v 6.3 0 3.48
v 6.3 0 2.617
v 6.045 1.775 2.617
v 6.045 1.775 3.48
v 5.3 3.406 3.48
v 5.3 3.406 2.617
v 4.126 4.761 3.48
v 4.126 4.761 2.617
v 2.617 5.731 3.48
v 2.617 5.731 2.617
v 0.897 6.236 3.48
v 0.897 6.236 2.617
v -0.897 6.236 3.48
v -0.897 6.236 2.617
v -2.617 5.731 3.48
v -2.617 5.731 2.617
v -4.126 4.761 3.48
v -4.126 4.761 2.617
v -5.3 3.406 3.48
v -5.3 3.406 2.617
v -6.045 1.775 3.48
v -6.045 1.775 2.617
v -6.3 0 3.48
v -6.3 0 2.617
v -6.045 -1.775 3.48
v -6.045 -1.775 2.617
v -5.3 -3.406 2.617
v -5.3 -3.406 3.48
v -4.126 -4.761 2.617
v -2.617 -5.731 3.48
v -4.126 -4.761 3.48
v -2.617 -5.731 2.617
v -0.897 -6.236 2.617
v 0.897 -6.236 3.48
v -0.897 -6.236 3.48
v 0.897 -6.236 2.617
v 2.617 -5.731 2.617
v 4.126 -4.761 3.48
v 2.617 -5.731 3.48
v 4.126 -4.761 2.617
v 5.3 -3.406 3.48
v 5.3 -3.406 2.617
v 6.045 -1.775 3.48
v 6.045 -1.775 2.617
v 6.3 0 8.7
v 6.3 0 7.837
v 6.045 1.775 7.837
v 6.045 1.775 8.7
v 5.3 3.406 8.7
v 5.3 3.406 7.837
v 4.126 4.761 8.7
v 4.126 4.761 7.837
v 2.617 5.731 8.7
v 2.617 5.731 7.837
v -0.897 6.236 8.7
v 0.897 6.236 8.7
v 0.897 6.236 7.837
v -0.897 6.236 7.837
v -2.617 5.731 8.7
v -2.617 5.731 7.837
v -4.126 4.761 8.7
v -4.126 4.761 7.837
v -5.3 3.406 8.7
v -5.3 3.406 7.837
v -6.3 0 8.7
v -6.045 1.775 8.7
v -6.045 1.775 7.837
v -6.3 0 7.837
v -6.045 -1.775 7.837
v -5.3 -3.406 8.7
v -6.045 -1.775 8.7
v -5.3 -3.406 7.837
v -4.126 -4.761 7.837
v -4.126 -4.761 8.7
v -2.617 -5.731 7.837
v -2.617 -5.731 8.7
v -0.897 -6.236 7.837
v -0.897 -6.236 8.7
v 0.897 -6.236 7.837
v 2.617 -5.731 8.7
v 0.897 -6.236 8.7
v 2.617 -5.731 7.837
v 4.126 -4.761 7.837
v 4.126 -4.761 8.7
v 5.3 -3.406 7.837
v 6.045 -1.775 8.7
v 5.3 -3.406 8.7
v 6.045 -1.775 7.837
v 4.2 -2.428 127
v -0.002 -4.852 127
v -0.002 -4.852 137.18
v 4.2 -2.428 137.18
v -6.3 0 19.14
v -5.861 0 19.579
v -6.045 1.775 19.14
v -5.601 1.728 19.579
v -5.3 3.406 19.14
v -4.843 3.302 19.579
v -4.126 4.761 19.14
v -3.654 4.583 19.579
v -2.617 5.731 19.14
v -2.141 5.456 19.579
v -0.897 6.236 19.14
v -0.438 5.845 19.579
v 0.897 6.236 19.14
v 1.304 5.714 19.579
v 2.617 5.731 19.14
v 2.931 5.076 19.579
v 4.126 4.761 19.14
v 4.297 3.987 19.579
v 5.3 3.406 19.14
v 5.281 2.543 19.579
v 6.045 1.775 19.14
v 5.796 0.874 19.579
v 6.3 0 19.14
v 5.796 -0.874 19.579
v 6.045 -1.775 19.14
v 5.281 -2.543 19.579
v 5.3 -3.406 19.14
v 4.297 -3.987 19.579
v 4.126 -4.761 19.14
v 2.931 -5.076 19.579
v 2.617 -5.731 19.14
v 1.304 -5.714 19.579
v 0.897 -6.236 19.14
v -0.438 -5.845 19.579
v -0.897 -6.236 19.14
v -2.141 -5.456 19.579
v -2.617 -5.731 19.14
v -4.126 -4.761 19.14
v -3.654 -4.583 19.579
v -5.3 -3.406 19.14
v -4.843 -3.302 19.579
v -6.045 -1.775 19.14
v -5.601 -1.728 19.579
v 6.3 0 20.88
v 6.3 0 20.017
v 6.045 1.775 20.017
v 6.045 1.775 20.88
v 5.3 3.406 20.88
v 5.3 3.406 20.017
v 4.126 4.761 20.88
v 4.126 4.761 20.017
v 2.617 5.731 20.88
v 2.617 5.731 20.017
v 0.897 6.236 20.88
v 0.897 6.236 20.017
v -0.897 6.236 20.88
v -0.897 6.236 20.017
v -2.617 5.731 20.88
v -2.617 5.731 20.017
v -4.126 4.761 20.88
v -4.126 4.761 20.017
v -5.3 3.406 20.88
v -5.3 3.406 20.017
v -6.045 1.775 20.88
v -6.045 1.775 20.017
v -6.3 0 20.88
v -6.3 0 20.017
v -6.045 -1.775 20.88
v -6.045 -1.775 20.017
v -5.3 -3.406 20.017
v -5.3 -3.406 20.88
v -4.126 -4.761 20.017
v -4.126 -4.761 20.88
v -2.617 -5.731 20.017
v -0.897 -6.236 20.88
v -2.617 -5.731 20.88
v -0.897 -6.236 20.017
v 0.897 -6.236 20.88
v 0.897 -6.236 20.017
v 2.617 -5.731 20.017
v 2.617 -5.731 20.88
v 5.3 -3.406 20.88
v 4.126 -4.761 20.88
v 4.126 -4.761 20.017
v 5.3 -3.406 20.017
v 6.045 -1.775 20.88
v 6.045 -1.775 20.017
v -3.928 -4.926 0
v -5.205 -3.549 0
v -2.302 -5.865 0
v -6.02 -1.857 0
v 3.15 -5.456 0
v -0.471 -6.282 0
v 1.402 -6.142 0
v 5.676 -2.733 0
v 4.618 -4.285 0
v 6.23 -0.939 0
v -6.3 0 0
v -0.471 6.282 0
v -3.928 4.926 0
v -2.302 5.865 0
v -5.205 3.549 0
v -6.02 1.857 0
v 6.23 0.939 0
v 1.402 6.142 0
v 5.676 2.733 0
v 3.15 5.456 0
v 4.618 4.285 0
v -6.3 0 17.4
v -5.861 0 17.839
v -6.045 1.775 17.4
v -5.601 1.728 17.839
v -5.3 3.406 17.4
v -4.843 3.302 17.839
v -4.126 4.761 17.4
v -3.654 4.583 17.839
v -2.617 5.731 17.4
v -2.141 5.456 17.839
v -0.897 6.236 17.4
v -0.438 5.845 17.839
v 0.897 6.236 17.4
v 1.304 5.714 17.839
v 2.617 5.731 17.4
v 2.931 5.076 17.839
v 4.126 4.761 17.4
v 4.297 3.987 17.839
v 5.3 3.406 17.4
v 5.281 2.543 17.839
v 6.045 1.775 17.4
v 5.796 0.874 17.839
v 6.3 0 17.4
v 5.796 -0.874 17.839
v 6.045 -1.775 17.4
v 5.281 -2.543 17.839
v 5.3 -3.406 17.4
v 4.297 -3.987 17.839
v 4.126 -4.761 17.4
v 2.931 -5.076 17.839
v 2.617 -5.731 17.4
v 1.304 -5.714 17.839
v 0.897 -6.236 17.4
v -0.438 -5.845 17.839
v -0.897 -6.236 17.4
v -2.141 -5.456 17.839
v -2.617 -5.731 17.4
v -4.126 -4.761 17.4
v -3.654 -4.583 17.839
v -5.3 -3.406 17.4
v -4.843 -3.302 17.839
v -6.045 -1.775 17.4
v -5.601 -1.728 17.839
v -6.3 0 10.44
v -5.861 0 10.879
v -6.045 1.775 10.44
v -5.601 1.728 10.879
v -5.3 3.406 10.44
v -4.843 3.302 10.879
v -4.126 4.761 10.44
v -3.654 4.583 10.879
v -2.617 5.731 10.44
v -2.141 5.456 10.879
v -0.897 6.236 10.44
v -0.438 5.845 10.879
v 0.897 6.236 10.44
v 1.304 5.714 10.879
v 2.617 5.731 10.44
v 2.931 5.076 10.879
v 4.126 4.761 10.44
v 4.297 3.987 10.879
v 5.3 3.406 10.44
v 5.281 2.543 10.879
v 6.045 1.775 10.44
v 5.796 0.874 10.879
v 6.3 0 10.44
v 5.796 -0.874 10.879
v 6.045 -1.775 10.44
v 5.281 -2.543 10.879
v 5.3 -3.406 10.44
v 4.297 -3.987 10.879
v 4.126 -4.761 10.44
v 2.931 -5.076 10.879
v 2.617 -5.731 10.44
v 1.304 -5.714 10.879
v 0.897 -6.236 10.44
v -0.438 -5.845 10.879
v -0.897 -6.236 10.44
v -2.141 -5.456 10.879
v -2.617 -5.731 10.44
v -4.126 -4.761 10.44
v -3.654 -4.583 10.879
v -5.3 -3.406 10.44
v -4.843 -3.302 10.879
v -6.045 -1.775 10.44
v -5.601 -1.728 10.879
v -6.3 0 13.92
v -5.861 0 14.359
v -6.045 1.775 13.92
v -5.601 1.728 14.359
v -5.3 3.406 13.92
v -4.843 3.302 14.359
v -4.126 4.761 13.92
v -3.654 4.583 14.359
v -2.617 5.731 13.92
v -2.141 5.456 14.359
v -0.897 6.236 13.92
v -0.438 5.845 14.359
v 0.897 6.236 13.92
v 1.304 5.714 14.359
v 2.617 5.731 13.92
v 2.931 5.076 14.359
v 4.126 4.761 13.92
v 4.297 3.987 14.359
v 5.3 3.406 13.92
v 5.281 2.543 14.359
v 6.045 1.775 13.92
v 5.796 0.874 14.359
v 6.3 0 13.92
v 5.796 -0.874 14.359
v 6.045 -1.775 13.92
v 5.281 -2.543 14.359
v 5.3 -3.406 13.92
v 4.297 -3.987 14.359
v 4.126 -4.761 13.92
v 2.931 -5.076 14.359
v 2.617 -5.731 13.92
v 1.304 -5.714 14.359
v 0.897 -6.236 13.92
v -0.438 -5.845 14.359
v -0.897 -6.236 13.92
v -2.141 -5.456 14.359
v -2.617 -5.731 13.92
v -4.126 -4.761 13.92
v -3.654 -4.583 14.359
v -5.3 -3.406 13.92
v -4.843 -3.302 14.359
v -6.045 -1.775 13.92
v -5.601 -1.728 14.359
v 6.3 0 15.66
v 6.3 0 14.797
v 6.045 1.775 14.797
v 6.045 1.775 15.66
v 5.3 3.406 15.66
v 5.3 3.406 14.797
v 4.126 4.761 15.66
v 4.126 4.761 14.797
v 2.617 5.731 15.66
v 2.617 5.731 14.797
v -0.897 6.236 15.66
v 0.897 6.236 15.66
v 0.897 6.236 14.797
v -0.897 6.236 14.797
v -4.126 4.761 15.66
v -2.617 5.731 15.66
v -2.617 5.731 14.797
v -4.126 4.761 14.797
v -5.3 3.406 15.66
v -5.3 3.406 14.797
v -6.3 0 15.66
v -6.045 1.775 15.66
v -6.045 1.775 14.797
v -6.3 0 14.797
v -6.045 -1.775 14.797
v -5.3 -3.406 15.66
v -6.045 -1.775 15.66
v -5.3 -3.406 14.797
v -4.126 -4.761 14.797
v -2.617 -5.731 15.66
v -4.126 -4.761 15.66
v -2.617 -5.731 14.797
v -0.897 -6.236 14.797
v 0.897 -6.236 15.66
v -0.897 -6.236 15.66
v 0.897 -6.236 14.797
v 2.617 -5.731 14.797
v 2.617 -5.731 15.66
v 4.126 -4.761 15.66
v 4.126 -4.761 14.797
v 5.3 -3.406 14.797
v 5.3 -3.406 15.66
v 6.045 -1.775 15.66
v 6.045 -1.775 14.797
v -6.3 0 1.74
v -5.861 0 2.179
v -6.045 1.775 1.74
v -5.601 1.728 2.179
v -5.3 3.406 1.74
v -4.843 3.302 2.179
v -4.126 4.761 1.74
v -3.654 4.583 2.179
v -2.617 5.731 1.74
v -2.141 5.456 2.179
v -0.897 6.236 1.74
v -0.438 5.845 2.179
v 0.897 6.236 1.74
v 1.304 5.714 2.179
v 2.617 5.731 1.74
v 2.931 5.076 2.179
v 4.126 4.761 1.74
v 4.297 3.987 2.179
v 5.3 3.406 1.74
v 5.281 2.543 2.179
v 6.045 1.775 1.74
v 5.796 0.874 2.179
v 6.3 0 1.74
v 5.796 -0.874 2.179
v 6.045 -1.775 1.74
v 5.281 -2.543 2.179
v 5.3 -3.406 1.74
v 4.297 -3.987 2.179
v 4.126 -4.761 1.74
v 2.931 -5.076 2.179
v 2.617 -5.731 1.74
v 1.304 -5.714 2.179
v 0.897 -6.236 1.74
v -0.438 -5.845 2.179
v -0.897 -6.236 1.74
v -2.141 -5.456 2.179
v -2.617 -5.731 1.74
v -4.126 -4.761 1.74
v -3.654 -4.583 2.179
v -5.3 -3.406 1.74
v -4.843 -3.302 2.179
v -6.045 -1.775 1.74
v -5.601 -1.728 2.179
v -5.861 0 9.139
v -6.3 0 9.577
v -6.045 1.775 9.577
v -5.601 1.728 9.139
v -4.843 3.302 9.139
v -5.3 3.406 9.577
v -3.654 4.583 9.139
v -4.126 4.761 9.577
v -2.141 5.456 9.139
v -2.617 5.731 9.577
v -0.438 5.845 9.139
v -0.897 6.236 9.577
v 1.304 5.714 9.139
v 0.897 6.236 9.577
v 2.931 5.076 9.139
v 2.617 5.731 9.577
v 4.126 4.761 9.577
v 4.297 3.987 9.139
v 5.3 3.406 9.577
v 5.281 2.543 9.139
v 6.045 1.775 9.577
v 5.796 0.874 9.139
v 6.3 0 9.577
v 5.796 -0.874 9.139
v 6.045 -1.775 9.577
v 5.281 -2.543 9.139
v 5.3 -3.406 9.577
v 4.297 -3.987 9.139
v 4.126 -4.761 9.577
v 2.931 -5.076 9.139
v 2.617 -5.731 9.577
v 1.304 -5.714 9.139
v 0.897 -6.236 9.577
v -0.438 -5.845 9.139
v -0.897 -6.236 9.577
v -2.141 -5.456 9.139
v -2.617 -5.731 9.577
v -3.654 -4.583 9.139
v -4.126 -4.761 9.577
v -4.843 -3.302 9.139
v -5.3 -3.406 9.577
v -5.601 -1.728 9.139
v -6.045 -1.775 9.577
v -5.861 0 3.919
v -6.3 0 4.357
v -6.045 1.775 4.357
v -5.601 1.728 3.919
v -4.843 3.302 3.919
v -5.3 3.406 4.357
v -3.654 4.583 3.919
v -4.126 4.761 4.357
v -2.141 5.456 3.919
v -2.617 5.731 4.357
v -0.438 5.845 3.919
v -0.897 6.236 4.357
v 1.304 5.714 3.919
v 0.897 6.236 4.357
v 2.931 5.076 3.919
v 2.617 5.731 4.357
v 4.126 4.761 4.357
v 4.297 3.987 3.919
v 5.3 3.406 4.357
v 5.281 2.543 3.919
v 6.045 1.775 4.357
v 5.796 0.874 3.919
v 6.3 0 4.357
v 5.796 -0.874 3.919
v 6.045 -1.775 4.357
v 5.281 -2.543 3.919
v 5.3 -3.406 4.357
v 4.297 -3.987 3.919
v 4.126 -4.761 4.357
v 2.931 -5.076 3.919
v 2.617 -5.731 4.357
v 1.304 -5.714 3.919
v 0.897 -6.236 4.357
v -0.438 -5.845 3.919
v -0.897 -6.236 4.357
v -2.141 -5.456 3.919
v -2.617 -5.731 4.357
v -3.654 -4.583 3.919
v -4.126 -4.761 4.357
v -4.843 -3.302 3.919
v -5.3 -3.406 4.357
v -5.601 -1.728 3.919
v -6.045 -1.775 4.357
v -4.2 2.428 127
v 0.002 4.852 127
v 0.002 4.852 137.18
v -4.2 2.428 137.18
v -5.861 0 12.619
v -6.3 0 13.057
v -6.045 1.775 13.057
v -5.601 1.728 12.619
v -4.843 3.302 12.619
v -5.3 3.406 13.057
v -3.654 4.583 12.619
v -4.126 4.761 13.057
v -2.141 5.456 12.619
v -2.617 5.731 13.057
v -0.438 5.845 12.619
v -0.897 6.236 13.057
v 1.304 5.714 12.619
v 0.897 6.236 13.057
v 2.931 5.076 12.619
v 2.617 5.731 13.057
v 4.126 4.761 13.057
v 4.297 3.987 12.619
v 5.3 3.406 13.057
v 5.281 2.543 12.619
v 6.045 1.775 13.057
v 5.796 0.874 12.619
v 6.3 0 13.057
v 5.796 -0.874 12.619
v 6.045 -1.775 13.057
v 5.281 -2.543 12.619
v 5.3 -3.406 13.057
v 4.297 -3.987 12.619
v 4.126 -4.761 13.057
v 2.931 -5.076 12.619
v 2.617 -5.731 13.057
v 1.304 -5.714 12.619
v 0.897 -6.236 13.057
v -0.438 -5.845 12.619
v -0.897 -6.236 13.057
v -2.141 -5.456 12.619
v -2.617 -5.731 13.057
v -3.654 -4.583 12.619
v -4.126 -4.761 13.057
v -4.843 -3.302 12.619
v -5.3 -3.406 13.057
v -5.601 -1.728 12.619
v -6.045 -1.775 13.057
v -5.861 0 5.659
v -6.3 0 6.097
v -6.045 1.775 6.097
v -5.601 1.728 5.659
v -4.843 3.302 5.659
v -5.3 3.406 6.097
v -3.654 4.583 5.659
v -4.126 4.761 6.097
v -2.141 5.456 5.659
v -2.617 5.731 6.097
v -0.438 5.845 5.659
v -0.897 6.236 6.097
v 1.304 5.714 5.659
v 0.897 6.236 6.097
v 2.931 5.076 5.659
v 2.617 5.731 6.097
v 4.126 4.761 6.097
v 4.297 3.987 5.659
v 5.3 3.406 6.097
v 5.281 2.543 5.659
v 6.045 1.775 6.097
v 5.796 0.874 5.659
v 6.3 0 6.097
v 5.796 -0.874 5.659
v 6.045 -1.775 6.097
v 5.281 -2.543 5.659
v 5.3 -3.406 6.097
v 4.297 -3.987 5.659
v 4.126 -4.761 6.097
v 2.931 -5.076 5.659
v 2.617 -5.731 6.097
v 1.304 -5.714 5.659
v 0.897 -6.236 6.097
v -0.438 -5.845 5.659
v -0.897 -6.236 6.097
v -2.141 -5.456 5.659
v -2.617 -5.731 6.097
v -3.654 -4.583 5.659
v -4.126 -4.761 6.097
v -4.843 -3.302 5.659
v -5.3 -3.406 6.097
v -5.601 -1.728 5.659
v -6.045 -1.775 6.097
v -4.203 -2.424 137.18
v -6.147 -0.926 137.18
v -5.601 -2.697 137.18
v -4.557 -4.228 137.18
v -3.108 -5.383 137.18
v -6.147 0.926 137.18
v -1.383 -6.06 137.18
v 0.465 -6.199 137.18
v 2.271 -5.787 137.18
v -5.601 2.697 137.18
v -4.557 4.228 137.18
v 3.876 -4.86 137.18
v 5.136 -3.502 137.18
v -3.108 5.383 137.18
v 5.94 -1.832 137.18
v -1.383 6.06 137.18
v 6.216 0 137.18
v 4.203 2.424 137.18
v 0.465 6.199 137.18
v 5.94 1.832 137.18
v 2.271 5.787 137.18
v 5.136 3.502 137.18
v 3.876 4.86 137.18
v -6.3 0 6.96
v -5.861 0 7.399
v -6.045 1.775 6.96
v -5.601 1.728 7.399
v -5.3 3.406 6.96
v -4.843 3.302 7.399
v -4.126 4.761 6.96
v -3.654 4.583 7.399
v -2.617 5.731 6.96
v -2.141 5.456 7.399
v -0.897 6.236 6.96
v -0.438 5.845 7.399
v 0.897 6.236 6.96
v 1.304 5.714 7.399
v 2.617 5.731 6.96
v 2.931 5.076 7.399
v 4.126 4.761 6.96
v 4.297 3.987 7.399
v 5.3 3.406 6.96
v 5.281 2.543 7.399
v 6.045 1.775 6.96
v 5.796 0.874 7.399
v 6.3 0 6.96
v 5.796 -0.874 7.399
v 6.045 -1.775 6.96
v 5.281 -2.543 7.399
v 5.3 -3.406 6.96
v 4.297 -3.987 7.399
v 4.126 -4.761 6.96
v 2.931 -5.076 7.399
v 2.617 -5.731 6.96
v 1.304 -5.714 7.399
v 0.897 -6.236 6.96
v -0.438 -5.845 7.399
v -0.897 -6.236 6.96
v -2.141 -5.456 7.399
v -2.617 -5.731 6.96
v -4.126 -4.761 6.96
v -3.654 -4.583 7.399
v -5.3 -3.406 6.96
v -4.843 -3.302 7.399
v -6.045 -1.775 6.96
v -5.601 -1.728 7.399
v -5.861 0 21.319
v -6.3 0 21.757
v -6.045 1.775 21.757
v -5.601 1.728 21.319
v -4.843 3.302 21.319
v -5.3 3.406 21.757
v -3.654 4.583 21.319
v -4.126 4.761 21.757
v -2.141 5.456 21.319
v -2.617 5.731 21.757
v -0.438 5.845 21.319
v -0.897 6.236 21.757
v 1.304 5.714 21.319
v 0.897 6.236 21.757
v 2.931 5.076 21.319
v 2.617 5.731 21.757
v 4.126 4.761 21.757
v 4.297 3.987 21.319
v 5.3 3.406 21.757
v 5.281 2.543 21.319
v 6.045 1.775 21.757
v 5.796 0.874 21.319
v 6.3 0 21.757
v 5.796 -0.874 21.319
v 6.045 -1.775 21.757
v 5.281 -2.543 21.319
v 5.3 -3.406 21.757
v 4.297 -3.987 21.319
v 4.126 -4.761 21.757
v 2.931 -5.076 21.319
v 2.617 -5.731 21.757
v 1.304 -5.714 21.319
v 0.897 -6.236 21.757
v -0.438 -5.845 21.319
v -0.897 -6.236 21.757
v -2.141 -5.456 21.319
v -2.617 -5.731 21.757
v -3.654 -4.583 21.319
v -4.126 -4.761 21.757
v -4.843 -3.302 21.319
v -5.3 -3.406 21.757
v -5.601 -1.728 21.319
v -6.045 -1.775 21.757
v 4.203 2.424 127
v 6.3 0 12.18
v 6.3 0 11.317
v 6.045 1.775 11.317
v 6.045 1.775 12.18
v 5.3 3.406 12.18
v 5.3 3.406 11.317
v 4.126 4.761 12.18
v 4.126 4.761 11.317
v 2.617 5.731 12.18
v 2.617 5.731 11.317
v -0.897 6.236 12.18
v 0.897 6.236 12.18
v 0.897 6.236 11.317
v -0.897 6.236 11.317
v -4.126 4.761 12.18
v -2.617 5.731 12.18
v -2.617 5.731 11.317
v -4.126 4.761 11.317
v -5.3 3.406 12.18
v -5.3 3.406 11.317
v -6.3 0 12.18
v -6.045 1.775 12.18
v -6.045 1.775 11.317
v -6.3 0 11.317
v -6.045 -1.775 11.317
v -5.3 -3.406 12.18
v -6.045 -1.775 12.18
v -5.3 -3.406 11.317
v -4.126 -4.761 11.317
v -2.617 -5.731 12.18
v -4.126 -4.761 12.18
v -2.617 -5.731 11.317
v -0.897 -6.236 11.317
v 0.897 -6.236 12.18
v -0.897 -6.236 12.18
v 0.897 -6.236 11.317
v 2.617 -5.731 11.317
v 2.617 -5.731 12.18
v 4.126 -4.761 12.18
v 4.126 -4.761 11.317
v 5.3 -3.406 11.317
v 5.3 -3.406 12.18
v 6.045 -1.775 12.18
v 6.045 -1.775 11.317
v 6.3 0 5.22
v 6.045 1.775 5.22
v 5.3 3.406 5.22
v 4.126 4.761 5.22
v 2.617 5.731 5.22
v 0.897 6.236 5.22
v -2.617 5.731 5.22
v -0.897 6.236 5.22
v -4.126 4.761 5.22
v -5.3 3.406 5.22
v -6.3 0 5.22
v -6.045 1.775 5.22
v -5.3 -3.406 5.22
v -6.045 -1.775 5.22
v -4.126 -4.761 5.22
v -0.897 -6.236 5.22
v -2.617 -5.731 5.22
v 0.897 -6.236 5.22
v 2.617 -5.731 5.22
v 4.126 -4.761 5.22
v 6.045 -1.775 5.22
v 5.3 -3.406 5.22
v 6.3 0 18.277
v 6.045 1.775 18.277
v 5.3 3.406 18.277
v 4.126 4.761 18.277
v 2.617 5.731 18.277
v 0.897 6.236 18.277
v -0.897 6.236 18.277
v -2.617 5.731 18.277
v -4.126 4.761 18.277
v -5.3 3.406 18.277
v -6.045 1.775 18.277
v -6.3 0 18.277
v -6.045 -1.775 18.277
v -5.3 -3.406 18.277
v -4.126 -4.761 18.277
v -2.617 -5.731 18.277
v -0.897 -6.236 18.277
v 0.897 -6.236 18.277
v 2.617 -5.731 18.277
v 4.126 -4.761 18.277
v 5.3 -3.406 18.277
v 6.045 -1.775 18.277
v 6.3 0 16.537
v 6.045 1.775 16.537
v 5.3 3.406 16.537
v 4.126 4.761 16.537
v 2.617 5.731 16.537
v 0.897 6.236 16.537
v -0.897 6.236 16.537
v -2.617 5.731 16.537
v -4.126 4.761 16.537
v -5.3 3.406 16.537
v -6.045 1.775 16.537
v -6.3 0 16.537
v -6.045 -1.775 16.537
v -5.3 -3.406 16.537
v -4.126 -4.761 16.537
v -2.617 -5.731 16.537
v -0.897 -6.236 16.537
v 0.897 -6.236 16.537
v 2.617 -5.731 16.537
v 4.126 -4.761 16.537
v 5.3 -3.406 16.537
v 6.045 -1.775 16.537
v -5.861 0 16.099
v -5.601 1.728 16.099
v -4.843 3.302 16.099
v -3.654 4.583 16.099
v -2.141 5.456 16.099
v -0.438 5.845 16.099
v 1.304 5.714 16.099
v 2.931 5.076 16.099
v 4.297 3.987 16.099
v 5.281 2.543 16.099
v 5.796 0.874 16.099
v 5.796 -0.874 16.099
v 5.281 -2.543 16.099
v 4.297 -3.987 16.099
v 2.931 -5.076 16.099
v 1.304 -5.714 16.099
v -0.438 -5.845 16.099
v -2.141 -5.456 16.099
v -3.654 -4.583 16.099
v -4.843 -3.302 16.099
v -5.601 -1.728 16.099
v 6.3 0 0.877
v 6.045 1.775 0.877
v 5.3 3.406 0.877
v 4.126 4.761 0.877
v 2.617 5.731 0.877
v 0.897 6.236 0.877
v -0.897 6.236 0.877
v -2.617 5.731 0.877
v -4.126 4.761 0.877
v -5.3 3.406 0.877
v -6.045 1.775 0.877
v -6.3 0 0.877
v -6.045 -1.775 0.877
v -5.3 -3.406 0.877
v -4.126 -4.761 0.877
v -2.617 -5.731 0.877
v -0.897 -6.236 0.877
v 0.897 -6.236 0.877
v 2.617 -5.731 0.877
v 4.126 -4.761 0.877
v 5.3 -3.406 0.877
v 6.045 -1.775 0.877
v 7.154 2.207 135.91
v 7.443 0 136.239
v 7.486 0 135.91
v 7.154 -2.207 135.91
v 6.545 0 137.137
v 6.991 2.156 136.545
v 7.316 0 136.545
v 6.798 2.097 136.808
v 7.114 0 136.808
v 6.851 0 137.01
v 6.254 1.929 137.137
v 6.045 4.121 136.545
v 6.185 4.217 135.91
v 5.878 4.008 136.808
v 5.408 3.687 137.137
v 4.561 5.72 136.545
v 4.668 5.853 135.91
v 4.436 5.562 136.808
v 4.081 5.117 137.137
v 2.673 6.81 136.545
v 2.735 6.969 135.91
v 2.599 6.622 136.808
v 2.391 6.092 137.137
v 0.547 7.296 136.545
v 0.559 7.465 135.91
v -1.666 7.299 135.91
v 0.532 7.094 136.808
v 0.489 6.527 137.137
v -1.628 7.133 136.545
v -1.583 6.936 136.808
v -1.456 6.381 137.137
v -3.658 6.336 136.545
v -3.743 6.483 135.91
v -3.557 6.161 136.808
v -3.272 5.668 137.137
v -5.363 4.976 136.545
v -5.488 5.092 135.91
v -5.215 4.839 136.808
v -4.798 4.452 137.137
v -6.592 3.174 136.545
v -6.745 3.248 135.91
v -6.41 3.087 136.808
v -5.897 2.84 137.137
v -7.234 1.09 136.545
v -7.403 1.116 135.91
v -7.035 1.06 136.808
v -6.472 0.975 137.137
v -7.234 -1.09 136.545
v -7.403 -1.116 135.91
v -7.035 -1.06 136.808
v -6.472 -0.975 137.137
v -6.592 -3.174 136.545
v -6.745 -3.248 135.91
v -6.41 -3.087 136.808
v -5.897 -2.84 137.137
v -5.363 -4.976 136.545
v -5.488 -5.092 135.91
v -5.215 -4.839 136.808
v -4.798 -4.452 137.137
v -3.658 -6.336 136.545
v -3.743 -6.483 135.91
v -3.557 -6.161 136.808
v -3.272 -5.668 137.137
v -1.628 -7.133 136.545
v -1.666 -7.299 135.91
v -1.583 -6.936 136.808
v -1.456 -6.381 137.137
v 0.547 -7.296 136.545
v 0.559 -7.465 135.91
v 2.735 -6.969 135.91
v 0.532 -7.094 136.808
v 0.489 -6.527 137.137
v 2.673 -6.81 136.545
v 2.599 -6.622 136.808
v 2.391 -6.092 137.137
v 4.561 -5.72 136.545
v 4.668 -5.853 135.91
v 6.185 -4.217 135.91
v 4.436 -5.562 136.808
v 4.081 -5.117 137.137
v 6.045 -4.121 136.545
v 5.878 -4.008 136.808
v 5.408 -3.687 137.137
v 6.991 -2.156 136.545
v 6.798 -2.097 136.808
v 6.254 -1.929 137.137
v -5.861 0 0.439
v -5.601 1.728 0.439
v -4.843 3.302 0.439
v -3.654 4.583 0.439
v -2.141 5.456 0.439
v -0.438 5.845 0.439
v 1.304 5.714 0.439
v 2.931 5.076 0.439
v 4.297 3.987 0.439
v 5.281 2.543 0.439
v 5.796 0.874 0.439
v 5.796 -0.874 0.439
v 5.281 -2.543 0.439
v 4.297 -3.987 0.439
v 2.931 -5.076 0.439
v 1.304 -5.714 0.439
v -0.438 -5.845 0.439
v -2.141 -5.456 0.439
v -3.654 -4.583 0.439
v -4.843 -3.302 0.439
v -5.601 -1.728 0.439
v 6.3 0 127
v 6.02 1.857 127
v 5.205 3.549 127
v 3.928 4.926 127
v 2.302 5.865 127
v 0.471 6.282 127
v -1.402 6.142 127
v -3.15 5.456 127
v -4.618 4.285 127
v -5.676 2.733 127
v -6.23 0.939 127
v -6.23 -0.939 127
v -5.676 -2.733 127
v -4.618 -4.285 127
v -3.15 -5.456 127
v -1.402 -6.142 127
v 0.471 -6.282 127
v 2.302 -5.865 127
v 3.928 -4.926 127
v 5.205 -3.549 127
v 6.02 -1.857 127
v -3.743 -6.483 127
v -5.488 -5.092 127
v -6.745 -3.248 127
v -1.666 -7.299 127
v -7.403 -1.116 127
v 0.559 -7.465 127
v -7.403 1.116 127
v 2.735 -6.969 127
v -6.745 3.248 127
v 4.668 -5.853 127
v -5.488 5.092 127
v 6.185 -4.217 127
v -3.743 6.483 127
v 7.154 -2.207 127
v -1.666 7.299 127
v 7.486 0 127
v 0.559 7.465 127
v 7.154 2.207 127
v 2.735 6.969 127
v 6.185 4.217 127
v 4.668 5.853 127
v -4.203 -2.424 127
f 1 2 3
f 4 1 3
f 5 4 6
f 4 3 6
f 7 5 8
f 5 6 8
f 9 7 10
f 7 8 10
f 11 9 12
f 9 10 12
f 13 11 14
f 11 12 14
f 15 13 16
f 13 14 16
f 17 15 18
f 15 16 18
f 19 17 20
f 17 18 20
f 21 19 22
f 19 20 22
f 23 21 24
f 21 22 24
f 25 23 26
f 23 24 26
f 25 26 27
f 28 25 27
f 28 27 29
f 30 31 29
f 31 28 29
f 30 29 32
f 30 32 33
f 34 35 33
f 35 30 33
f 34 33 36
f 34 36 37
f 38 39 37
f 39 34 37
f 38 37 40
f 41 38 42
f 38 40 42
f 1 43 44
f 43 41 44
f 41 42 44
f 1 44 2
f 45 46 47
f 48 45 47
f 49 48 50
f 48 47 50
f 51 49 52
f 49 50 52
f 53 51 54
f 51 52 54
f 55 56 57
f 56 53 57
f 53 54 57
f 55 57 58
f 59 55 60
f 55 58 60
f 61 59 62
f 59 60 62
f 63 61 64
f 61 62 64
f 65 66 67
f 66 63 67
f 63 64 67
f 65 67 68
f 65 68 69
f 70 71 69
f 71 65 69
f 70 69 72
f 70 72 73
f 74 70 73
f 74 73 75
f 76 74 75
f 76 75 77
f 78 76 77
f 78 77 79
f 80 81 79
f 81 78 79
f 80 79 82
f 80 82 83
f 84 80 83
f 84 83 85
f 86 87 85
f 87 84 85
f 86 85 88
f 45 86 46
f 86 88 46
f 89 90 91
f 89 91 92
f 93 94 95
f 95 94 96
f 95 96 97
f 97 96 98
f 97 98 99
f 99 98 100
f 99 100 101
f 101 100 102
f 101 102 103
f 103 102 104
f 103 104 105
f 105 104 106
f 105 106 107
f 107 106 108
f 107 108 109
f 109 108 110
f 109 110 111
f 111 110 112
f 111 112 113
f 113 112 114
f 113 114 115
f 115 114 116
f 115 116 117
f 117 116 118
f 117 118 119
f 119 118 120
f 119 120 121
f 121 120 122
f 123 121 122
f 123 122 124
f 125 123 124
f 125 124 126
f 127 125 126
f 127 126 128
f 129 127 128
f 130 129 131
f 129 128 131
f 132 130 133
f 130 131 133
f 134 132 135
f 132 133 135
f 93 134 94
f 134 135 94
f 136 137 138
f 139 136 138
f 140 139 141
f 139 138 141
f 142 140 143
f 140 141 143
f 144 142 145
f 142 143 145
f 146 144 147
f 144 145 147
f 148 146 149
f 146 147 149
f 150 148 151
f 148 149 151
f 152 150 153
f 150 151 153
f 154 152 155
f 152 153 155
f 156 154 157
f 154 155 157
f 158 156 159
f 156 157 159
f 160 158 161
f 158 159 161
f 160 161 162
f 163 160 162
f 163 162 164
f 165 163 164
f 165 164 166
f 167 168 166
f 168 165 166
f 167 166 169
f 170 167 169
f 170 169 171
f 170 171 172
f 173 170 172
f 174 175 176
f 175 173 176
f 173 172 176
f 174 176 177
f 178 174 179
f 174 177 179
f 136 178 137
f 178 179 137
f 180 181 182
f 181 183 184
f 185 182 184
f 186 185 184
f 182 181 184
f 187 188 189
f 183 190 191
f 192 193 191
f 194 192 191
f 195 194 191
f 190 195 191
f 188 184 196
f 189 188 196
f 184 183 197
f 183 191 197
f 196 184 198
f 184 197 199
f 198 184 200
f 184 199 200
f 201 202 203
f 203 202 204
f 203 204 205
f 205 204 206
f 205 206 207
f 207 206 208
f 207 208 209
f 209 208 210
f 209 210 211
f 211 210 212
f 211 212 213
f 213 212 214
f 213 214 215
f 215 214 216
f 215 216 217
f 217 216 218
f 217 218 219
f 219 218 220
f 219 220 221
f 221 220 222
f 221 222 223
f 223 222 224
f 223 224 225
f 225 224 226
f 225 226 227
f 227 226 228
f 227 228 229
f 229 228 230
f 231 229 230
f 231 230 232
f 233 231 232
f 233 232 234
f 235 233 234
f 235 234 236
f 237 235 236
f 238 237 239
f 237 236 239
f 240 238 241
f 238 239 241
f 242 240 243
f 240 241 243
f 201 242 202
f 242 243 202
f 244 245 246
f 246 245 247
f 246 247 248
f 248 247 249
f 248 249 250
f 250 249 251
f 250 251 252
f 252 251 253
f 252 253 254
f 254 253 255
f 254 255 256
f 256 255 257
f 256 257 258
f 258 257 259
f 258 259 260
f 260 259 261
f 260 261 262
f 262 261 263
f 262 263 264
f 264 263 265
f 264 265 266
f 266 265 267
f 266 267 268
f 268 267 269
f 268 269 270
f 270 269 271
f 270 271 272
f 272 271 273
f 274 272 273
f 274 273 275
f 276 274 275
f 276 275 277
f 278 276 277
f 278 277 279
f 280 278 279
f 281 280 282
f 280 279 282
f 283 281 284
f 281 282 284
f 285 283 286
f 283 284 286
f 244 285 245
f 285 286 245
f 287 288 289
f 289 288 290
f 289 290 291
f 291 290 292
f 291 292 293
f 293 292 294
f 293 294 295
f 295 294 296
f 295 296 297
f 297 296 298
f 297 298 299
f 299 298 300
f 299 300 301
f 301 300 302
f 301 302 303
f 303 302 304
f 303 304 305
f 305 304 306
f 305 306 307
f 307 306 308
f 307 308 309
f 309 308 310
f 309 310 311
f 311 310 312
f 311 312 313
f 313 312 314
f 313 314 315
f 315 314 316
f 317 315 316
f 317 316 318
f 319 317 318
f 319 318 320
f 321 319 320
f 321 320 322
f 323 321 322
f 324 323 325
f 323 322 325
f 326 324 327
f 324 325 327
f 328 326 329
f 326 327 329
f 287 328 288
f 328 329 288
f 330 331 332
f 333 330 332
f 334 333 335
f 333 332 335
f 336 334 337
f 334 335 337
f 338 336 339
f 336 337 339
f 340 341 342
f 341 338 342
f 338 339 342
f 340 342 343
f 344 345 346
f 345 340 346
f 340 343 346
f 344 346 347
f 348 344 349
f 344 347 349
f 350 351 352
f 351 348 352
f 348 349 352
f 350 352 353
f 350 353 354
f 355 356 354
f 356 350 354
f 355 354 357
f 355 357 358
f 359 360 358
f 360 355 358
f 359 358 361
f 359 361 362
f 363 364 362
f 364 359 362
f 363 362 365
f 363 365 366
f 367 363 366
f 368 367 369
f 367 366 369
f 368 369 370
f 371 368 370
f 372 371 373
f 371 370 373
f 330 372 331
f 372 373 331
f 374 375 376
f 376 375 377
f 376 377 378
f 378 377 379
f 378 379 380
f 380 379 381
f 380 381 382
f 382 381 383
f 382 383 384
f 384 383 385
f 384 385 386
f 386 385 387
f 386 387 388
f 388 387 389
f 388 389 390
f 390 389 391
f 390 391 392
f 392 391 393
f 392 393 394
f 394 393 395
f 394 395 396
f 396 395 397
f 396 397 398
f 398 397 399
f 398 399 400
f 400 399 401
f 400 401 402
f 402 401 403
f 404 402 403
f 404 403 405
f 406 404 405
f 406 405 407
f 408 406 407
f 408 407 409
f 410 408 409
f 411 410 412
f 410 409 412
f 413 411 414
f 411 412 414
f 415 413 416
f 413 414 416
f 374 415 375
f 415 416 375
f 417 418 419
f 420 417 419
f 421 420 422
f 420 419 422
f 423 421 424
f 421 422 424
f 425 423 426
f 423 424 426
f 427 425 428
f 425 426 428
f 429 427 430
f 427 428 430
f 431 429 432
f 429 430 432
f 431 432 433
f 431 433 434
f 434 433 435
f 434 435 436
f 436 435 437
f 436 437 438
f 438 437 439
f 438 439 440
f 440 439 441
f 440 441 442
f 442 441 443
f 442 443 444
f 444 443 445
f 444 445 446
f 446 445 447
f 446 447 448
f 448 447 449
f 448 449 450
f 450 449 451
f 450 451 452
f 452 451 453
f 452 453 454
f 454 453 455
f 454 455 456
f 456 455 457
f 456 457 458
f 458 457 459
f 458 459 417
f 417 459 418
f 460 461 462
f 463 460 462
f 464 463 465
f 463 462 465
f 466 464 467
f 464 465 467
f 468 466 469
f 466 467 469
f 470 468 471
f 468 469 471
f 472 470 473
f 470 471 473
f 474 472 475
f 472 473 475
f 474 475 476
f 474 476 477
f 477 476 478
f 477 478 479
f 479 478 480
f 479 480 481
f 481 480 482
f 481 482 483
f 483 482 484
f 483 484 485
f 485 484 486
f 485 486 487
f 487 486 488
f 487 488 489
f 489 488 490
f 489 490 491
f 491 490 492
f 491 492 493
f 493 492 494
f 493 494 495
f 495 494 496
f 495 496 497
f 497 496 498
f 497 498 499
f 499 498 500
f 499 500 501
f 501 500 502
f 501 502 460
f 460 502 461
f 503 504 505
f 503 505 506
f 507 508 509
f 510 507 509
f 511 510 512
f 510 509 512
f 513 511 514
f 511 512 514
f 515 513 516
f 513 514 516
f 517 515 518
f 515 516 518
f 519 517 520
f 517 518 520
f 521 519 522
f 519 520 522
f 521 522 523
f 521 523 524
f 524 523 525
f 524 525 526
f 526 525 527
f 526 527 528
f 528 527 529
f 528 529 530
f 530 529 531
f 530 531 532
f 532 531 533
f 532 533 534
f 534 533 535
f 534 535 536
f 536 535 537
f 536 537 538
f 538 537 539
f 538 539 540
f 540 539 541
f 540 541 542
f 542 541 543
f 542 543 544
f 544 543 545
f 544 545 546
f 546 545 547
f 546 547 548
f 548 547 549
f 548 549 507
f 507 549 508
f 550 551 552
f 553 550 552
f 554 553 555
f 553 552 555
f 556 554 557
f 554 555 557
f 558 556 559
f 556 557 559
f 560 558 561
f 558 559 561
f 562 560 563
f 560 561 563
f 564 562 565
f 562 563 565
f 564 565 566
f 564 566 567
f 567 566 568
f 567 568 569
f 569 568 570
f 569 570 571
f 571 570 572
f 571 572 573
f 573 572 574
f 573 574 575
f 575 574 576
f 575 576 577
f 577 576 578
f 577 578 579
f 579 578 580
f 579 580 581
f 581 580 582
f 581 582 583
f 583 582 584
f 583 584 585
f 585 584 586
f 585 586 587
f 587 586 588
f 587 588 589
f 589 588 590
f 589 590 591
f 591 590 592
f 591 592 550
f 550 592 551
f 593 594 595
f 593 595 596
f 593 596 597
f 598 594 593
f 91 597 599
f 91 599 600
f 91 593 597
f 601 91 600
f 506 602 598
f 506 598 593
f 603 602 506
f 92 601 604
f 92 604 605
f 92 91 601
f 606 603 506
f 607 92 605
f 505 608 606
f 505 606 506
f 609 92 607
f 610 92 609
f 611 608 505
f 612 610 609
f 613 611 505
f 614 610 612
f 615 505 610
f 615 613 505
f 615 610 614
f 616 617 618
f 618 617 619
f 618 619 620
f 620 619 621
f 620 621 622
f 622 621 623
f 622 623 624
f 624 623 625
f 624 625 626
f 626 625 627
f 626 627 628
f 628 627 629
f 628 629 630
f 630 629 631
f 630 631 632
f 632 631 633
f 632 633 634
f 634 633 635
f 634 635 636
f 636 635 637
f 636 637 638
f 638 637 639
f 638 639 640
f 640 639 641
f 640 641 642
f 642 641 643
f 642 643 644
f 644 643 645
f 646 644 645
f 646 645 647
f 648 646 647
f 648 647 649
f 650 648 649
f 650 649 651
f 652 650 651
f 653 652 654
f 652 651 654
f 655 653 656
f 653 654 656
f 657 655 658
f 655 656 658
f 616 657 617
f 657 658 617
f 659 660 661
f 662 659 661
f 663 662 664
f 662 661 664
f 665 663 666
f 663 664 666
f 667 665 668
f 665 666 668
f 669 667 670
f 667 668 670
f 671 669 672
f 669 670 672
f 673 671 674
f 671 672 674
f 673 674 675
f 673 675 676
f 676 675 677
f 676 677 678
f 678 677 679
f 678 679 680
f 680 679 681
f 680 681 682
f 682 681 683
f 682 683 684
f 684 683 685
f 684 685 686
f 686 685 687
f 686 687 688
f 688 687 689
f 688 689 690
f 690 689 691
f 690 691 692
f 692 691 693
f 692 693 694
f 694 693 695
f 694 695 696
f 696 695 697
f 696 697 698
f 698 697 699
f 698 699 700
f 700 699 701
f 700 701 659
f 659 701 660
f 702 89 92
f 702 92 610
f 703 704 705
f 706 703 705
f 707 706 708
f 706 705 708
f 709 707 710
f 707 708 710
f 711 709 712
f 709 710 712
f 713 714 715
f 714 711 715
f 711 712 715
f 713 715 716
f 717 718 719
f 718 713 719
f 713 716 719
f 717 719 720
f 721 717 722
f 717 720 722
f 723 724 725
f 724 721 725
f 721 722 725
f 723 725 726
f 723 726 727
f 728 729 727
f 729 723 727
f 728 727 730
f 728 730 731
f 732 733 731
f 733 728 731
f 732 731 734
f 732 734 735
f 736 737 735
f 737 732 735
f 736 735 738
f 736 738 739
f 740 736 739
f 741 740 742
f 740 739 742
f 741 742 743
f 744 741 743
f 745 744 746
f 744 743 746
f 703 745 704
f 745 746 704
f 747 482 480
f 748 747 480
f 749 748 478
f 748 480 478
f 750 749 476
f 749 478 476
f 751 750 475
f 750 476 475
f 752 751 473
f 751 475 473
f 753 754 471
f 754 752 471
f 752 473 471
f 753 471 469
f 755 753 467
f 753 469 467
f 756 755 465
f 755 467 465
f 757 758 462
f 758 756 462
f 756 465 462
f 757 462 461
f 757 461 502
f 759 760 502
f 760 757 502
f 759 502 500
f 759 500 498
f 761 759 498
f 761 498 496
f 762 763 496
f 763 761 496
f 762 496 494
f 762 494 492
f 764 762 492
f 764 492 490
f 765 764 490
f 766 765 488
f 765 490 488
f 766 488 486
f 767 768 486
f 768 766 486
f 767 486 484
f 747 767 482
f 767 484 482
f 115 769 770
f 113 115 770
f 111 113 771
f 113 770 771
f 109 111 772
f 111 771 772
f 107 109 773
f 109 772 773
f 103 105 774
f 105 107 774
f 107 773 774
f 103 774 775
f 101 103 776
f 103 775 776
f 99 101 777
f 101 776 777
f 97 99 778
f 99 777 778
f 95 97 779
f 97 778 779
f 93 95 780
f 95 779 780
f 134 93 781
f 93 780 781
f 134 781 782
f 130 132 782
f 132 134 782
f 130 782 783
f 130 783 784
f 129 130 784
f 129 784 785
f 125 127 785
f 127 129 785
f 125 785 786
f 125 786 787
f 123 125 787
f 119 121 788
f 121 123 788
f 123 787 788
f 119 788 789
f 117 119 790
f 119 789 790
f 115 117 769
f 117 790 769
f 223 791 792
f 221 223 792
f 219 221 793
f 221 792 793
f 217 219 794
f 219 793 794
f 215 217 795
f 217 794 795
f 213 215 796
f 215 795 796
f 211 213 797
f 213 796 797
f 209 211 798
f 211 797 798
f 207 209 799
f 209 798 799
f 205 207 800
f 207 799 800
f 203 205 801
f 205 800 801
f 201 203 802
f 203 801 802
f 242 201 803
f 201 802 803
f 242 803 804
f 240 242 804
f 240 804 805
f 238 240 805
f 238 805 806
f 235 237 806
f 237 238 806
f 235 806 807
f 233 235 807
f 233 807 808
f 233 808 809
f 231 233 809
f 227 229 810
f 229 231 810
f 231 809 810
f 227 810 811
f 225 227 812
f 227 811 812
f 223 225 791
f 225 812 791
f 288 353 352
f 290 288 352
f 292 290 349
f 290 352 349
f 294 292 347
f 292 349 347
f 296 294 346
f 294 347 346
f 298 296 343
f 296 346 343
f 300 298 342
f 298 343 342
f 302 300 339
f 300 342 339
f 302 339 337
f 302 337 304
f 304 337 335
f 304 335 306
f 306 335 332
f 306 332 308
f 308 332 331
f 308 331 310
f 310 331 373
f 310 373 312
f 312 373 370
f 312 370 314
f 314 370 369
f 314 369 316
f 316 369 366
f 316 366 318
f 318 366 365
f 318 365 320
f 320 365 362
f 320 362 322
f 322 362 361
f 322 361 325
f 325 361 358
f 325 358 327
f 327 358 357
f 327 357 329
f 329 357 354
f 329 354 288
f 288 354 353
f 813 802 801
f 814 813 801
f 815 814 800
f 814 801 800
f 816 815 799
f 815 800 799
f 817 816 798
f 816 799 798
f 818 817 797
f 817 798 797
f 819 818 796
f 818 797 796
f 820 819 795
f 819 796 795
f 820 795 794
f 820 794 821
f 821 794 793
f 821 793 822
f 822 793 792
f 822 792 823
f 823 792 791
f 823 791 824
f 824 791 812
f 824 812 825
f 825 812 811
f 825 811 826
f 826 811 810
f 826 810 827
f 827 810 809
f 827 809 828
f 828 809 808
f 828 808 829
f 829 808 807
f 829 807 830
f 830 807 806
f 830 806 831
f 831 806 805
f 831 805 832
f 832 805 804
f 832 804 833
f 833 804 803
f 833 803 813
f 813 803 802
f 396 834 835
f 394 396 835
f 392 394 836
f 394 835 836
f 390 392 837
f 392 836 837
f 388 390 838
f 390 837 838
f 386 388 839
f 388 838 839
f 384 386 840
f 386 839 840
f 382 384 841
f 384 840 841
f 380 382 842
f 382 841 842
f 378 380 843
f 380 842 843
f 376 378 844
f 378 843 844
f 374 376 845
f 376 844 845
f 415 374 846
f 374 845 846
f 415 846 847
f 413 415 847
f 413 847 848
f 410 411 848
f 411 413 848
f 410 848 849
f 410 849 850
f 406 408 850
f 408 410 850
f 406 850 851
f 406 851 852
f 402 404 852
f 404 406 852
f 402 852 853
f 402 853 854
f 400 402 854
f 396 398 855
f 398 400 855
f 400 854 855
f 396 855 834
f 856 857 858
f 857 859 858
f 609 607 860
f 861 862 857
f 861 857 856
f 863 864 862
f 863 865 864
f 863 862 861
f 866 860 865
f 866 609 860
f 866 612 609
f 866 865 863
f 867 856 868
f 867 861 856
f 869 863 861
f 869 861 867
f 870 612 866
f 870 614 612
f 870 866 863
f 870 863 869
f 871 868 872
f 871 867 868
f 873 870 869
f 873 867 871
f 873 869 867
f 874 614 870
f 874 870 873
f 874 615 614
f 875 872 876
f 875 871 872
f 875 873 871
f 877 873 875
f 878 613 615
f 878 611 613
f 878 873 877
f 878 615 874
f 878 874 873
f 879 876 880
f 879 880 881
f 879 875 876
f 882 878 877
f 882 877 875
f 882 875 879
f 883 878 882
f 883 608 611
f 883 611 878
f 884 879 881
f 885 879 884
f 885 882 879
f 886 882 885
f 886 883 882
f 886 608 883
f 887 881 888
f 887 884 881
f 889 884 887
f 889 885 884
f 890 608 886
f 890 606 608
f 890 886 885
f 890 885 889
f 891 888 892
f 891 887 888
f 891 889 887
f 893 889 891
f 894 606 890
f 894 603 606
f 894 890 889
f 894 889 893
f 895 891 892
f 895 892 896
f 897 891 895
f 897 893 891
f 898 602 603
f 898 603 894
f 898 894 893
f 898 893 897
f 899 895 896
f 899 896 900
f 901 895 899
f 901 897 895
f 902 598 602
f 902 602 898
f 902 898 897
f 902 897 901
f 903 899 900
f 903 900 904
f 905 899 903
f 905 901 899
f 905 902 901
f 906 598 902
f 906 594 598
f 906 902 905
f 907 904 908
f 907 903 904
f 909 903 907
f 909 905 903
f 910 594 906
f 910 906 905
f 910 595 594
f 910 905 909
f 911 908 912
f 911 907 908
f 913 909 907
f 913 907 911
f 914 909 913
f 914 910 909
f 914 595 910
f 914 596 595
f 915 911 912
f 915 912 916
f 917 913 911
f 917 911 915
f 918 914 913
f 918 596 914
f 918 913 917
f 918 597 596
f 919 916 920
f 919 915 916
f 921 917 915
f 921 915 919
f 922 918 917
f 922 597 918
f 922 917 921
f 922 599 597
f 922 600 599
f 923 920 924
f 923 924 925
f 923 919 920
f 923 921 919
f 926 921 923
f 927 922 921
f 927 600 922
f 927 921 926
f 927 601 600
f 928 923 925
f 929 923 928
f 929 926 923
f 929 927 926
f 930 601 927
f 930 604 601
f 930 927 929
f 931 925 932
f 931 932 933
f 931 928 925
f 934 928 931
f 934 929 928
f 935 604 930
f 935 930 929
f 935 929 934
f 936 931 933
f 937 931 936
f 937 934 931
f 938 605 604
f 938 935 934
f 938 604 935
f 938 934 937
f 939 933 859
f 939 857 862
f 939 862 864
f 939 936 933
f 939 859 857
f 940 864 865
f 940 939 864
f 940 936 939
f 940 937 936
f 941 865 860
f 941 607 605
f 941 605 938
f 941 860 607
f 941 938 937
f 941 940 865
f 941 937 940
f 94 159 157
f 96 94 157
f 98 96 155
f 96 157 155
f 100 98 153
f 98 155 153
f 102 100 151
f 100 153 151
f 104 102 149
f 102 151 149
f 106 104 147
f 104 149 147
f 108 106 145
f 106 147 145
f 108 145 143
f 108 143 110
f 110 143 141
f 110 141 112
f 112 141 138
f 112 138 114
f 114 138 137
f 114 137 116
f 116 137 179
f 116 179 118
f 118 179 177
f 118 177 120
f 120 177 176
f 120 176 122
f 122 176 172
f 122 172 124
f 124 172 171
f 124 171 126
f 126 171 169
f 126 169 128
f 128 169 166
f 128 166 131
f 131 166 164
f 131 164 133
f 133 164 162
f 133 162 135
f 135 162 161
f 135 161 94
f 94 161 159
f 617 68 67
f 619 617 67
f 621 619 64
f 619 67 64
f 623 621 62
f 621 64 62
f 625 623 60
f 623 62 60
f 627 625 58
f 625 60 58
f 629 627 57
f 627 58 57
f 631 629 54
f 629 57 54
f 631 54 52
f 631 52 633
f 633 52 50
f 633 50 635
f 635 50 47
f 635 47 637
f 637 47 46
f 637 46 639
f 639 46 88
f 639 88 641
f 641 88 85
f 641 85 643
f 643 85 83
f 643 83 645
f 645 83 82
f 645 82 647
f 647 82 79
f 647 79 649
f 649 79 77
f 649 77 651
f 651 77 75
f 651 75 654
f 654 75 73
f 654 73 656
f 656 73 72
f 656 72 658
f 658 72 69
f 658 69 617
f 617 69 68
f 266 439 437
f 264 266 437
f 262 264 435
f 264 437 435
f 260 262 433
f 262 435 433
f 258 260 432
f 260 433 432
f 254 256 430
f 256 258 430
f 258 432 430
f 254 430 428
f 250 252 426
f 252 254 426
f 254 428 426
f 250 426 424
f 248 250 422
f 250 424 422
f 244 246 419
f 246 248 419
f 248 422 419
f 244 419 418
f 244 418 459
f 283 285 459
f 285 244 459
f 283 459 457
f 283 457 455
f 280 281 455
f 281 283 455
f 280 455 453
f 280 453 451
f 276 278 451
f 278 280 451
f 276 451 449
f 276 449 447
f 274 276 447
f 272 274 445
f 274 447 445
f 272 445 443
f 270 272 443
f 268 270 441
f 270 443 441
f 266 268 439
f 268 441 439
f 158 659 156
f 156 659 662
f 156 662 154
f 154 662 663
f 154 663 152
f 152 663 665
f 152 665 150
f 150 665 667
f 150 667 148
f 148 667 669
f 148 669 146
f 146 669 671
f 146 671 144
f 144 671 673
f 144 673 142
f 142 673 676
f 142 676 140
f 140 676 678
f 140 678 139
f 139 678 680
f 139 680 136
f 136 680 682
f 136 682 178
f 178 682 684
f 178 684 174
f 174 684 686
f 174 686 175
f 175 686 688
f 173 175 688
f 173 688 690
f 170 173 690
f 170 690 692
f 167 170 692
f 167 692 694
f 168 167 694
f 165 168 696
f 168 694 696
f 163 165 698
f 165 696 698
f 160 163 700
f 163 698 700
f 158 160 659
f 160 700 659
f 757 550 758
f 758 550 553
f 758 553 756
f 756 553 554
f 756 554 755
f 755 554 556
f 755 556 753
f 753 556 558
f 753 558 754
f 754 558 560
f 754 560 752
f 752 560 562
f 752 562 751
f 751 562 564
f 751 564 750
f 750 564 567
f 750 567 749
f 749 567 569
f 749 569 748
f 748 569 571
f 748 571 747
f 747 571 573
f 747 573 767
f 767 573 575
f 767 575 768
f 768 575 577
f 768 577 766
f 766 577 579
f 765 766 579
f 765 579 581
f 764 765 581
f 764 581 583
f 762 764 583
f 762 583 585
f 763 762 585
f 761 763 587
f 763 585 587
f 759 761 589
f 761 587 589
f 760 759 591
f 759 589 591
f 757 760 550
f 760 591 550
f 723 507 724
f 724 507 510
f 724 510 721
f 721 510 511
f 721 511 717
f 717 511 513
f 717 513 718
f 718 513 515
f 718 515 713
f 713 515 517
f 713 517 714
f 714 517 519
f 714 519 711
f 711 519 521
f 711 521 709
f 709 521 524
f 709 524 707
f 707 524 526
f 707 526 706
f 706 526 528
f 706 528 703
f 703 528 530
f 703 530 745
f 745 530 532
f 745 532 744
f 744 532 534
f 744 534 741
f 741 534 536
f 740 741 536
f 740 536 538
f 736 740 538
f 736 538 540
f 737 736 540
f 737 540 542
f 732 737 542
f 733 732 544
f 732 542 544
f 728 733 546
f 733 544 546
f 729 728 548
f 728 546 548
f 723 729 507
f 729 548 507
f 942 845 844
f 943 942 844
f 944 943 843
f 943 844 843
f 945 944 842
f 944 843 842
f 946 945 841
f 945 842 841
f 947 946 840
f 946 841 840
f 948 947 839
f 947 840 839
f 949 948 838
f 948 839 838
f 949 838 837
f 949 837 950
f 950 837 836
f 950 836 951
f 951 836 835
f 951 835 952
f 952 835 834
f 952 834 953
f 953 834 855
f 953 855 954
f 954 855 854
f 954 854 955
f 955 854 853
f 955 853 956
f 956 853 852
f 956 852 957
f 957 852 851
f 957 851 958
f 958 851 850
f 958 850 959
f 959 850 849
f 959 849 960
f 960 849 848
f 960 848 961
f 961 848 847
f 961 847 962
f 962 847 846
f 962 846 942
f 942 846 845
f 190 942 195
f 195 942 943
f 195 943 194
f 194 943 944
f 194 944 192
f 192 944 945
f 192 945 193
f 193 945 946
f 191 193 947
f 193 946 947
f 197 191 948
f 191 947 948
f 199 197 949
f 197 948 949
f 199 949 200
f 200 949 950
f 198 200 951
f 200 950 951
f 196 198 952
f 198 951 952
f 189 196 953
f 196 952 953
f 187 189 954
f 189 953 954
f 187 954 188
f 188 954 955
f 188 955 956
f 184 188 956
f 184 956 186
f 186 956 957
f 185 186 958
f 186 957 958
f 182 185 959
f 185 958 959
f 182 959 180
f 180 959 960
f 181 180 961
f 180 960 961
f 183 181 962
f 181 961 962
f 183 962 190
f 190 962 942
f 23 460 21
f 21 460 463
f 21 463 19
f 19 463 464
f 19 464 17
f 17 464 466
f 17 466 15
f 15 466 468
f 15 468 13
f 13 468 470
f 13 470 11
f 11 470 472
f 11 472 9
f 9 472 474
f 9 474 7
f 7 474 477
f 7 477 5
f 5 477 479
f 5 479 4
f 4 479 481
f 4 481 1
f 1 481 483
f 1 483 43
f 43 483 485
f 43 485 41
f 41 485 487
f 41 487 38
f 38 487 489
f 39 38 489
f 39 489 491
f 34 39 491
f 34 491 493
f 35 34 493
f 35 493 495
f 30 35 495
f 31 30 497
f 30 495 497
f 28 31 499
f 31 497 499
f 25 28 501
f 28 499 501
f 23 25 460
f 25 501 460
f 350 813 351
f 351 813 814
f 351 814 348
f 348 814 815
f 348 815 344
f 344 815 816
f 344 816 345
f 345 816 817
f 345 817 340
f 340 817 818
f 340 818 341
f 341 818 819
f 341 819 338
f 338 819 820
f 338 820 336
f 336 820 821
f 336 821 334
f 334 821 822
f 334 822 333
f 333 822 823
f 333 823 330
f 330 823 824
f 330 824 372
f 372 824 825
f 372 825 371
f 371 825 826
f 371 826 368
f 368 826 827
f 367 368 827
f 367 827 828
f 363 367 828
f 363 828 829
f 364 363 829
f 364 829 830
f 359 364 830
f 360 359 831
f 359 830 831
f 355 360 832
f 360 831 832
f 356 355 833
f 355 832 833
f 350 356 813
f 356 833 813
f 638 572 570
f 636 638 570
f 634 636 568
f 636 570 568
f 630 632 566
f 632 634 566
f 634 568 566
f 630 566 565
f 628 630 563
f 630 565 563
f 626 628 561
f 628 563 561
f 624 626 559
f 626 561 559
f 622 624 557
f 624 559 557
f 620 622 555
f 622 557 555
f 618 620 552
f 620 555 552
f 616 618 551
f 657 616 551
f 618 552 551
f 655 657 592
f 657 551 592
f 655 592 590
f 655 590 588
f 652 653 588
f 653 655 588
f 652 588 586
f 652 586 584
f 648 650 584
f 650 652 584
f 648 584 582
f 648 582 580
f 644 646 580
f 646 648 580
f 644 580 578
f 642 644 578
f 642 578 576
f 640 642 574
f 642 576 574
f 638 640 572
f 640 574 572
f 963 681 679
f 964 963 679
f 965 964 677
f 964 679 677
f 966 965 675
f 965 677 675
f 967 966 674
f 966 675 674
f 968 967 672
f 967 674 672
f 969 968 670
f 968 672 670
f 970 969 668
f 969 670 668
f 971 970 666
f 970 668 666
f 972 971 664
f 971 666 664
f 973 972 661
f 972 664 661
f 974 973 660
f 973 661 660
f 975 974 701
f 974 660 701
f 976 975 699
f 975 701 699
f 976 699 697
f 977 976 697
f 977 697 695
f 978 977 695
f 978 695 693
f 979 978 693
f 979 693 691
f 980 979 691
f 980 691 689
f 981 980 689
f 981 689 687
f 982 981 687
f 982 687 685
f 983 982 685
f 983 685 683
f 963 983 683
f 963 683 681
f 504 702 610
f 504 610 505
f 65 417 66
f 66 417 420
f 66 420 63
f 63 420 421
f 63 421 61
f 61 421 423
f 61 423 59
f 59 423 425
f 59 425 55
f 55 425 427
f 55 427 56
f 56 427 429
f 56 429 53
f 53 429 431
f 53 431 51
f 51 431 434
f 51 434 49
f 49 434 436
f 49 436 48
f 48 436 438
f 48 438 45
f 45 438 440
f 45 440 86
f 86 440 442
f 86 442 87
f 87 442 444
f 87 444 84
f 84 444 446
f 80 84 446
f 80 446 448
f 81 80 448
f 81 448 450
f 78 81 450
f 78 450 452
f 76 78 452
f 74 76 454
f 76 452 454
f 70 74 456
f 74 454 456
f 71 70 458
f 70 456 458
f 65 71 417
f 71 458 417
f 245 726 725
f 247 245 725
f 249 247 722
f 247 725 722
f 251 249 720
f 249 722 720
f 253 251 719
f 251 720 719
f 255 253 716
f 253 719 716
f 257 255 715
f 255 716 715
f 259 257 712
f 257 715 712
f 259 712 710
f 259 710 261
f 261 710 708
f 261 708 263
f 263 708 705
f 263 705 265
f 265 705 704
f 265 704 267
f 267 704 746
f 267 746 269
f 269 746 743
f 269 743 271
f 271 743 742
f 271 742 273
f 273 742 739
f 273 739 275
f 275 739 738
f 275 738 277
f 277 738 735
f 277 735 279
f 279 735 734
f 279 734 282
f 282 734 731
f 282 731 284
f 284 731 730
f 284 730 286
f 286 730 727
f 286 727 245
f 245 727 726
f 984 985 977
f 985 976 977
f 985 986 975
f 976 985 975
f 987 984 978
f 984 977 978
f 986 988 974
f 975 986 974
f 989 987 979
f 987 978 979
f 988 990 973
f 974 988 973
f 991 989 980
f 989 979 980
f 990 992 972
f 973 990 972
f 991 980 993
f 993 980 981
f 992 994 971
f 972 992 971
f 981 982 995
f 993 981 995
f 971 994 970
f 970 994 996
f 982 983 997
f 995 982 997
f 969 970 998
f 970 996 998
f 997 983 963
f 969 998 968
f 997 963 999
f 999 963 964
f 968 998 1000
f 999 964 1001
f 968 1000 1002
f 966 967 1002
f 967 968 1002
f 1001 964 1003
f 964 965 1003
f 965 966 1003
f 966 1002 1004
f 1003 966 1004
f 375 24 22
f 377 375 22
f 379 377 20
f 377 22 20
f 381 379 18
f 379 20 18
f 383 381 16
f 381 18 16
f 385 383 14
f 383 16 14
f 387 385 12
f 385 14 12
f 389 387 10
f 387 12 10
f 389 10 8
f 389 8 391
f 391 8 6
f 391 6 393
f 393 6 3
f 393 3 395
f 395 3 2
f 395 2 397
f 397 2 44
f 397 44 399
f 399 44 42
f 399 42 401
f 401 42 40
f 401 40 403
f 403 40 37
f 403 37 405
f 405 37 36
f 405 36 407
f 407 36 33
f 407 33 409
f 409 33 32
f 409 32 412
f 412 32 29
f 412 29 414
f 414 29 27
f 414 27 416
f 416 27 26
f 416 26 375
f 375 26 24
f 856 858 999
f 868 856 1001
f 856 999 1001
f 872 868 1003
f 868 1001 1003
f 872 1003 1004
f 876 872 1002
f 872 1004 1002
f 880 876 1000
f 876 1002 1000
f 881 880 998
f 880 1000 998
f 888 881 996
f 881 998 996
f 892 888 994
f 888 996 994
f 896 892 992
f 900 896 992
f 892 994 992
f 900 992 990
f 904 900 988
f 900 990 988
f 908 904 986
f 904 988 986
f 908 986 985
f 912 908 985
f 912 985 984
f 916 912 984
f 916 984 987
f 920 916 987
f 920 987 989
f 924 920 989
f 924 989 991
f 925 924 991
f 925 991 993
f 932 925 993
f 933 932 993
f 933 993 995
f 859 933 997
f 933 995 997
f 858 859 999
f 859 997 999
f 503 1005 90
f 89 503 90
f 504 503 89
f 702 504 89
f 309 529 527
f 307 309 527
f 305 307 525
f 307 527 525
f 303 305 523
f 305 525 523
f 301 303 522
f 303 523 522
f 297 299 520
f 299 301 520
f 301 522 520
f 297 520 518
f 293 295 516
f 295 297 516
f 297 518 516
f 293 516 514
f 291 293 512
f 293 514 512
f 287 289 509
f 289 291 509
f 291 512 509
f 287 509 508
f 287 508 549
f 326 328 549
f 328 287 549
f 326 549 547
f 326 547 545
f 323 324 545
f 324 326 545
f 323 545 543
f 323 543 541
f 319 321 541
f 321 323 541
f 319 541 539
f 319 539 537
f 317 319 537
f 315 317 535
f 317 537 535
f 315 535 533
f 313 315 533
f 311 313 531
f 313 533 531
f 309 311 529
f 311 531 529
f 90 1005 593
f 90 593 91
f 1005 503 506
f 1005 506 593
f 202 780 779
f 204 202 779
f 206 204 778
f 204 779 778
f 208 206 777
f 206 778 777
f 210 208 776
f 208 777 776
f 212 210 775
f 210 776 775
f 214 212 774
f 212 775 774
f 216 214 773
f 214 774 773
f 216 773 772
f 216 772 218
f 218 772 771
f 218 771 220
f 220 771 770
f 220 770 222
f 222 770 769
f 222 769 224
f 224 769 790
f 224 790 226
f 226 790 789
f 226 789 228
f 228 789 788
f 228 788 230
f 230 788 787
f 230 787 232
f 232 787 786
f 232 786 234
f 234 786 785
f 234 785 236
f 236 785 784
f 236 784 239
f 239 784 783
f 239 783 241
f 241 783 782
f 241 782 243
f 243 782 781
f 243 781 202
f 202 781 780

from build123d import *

# Parameters (mm, degrees)
SKETCH1_R          = 6.3
EXTRUDE1_DEPTH     = 127
SKETCH2_R          = 7.486213626
EXTRUDE2_DEPTH     = 10.18
FILLET1_R          = 1.27
CUT_EXTRUDE1_DEPTH = 10.18
LPATTERN1_COUNT    = 13
LPATTERN1_PITCH    = 1.74


with BuildPart() as part:
    # Sketch1 → Extrude1 (new body)
    with BuildSketch(Plane.XY):
        Circle(SKETCH1_R)
    extrude(amount=EXTRUDE1_DEPTH)

    # Sketch2 → Extrude2 (add)
    with BuildSketch(Plane.XY.offset(127)):
        Circle(SKETCH2_R)
    extrude(amount=EXTRUDE2_DEPTH)

    # Fillet1
    fillet1_edges = [part.edges().sort_by_distance(p)[0] for p in [
        (-7.486213626, 0, 137.18),
    ]]
    fillet(fillet1_edges, radius=FILLET1_R)

    # Sketch3 → Cut-Extrude1 (cut)
    with BuildSketch(Plane.XY.offset(137.18)):
        Polygon((4.202603037, 2.423907976), (0.002135635, 4.85151498), (-4.200467402, 2.427607004), (-4.202603037, -2.423907976), (-0.002135635, -4.85151498), (4.200467402, -2.427607004), align=None)
    extrude(amount=-CUT_EXTRUDE1_DEPTH, mode=Mode.SUBTRACT)

    # Sketch4 → Cut-Revolve1 (revolve, cut)
    with BuildSketch(Plane(origin=(0, 0, 0), x_dir=(1, 0, 0), z_dir=(0, 1, 0))):
        Polygon((-6.3, 0), (-5.861323423, -0.438676577), (-6.3, -0.877353155), (-6.738676577, -0.438676577), align=None)
    cut_revolve1 = revolve(axis=Axis((0, 0, 127), (0, 0, -1)), mode=Mode.SUBTRACT)

    # LPattern1: Cut-Revolve1 ×13
    with Locations(*[(0, 0, i * LPATTERN1_PITCH) for i in range(1, LPATTERN1_COUNT)]):
        add(cut_revolve1, mode=Mode.SUBTRACT)


solid = part.part
